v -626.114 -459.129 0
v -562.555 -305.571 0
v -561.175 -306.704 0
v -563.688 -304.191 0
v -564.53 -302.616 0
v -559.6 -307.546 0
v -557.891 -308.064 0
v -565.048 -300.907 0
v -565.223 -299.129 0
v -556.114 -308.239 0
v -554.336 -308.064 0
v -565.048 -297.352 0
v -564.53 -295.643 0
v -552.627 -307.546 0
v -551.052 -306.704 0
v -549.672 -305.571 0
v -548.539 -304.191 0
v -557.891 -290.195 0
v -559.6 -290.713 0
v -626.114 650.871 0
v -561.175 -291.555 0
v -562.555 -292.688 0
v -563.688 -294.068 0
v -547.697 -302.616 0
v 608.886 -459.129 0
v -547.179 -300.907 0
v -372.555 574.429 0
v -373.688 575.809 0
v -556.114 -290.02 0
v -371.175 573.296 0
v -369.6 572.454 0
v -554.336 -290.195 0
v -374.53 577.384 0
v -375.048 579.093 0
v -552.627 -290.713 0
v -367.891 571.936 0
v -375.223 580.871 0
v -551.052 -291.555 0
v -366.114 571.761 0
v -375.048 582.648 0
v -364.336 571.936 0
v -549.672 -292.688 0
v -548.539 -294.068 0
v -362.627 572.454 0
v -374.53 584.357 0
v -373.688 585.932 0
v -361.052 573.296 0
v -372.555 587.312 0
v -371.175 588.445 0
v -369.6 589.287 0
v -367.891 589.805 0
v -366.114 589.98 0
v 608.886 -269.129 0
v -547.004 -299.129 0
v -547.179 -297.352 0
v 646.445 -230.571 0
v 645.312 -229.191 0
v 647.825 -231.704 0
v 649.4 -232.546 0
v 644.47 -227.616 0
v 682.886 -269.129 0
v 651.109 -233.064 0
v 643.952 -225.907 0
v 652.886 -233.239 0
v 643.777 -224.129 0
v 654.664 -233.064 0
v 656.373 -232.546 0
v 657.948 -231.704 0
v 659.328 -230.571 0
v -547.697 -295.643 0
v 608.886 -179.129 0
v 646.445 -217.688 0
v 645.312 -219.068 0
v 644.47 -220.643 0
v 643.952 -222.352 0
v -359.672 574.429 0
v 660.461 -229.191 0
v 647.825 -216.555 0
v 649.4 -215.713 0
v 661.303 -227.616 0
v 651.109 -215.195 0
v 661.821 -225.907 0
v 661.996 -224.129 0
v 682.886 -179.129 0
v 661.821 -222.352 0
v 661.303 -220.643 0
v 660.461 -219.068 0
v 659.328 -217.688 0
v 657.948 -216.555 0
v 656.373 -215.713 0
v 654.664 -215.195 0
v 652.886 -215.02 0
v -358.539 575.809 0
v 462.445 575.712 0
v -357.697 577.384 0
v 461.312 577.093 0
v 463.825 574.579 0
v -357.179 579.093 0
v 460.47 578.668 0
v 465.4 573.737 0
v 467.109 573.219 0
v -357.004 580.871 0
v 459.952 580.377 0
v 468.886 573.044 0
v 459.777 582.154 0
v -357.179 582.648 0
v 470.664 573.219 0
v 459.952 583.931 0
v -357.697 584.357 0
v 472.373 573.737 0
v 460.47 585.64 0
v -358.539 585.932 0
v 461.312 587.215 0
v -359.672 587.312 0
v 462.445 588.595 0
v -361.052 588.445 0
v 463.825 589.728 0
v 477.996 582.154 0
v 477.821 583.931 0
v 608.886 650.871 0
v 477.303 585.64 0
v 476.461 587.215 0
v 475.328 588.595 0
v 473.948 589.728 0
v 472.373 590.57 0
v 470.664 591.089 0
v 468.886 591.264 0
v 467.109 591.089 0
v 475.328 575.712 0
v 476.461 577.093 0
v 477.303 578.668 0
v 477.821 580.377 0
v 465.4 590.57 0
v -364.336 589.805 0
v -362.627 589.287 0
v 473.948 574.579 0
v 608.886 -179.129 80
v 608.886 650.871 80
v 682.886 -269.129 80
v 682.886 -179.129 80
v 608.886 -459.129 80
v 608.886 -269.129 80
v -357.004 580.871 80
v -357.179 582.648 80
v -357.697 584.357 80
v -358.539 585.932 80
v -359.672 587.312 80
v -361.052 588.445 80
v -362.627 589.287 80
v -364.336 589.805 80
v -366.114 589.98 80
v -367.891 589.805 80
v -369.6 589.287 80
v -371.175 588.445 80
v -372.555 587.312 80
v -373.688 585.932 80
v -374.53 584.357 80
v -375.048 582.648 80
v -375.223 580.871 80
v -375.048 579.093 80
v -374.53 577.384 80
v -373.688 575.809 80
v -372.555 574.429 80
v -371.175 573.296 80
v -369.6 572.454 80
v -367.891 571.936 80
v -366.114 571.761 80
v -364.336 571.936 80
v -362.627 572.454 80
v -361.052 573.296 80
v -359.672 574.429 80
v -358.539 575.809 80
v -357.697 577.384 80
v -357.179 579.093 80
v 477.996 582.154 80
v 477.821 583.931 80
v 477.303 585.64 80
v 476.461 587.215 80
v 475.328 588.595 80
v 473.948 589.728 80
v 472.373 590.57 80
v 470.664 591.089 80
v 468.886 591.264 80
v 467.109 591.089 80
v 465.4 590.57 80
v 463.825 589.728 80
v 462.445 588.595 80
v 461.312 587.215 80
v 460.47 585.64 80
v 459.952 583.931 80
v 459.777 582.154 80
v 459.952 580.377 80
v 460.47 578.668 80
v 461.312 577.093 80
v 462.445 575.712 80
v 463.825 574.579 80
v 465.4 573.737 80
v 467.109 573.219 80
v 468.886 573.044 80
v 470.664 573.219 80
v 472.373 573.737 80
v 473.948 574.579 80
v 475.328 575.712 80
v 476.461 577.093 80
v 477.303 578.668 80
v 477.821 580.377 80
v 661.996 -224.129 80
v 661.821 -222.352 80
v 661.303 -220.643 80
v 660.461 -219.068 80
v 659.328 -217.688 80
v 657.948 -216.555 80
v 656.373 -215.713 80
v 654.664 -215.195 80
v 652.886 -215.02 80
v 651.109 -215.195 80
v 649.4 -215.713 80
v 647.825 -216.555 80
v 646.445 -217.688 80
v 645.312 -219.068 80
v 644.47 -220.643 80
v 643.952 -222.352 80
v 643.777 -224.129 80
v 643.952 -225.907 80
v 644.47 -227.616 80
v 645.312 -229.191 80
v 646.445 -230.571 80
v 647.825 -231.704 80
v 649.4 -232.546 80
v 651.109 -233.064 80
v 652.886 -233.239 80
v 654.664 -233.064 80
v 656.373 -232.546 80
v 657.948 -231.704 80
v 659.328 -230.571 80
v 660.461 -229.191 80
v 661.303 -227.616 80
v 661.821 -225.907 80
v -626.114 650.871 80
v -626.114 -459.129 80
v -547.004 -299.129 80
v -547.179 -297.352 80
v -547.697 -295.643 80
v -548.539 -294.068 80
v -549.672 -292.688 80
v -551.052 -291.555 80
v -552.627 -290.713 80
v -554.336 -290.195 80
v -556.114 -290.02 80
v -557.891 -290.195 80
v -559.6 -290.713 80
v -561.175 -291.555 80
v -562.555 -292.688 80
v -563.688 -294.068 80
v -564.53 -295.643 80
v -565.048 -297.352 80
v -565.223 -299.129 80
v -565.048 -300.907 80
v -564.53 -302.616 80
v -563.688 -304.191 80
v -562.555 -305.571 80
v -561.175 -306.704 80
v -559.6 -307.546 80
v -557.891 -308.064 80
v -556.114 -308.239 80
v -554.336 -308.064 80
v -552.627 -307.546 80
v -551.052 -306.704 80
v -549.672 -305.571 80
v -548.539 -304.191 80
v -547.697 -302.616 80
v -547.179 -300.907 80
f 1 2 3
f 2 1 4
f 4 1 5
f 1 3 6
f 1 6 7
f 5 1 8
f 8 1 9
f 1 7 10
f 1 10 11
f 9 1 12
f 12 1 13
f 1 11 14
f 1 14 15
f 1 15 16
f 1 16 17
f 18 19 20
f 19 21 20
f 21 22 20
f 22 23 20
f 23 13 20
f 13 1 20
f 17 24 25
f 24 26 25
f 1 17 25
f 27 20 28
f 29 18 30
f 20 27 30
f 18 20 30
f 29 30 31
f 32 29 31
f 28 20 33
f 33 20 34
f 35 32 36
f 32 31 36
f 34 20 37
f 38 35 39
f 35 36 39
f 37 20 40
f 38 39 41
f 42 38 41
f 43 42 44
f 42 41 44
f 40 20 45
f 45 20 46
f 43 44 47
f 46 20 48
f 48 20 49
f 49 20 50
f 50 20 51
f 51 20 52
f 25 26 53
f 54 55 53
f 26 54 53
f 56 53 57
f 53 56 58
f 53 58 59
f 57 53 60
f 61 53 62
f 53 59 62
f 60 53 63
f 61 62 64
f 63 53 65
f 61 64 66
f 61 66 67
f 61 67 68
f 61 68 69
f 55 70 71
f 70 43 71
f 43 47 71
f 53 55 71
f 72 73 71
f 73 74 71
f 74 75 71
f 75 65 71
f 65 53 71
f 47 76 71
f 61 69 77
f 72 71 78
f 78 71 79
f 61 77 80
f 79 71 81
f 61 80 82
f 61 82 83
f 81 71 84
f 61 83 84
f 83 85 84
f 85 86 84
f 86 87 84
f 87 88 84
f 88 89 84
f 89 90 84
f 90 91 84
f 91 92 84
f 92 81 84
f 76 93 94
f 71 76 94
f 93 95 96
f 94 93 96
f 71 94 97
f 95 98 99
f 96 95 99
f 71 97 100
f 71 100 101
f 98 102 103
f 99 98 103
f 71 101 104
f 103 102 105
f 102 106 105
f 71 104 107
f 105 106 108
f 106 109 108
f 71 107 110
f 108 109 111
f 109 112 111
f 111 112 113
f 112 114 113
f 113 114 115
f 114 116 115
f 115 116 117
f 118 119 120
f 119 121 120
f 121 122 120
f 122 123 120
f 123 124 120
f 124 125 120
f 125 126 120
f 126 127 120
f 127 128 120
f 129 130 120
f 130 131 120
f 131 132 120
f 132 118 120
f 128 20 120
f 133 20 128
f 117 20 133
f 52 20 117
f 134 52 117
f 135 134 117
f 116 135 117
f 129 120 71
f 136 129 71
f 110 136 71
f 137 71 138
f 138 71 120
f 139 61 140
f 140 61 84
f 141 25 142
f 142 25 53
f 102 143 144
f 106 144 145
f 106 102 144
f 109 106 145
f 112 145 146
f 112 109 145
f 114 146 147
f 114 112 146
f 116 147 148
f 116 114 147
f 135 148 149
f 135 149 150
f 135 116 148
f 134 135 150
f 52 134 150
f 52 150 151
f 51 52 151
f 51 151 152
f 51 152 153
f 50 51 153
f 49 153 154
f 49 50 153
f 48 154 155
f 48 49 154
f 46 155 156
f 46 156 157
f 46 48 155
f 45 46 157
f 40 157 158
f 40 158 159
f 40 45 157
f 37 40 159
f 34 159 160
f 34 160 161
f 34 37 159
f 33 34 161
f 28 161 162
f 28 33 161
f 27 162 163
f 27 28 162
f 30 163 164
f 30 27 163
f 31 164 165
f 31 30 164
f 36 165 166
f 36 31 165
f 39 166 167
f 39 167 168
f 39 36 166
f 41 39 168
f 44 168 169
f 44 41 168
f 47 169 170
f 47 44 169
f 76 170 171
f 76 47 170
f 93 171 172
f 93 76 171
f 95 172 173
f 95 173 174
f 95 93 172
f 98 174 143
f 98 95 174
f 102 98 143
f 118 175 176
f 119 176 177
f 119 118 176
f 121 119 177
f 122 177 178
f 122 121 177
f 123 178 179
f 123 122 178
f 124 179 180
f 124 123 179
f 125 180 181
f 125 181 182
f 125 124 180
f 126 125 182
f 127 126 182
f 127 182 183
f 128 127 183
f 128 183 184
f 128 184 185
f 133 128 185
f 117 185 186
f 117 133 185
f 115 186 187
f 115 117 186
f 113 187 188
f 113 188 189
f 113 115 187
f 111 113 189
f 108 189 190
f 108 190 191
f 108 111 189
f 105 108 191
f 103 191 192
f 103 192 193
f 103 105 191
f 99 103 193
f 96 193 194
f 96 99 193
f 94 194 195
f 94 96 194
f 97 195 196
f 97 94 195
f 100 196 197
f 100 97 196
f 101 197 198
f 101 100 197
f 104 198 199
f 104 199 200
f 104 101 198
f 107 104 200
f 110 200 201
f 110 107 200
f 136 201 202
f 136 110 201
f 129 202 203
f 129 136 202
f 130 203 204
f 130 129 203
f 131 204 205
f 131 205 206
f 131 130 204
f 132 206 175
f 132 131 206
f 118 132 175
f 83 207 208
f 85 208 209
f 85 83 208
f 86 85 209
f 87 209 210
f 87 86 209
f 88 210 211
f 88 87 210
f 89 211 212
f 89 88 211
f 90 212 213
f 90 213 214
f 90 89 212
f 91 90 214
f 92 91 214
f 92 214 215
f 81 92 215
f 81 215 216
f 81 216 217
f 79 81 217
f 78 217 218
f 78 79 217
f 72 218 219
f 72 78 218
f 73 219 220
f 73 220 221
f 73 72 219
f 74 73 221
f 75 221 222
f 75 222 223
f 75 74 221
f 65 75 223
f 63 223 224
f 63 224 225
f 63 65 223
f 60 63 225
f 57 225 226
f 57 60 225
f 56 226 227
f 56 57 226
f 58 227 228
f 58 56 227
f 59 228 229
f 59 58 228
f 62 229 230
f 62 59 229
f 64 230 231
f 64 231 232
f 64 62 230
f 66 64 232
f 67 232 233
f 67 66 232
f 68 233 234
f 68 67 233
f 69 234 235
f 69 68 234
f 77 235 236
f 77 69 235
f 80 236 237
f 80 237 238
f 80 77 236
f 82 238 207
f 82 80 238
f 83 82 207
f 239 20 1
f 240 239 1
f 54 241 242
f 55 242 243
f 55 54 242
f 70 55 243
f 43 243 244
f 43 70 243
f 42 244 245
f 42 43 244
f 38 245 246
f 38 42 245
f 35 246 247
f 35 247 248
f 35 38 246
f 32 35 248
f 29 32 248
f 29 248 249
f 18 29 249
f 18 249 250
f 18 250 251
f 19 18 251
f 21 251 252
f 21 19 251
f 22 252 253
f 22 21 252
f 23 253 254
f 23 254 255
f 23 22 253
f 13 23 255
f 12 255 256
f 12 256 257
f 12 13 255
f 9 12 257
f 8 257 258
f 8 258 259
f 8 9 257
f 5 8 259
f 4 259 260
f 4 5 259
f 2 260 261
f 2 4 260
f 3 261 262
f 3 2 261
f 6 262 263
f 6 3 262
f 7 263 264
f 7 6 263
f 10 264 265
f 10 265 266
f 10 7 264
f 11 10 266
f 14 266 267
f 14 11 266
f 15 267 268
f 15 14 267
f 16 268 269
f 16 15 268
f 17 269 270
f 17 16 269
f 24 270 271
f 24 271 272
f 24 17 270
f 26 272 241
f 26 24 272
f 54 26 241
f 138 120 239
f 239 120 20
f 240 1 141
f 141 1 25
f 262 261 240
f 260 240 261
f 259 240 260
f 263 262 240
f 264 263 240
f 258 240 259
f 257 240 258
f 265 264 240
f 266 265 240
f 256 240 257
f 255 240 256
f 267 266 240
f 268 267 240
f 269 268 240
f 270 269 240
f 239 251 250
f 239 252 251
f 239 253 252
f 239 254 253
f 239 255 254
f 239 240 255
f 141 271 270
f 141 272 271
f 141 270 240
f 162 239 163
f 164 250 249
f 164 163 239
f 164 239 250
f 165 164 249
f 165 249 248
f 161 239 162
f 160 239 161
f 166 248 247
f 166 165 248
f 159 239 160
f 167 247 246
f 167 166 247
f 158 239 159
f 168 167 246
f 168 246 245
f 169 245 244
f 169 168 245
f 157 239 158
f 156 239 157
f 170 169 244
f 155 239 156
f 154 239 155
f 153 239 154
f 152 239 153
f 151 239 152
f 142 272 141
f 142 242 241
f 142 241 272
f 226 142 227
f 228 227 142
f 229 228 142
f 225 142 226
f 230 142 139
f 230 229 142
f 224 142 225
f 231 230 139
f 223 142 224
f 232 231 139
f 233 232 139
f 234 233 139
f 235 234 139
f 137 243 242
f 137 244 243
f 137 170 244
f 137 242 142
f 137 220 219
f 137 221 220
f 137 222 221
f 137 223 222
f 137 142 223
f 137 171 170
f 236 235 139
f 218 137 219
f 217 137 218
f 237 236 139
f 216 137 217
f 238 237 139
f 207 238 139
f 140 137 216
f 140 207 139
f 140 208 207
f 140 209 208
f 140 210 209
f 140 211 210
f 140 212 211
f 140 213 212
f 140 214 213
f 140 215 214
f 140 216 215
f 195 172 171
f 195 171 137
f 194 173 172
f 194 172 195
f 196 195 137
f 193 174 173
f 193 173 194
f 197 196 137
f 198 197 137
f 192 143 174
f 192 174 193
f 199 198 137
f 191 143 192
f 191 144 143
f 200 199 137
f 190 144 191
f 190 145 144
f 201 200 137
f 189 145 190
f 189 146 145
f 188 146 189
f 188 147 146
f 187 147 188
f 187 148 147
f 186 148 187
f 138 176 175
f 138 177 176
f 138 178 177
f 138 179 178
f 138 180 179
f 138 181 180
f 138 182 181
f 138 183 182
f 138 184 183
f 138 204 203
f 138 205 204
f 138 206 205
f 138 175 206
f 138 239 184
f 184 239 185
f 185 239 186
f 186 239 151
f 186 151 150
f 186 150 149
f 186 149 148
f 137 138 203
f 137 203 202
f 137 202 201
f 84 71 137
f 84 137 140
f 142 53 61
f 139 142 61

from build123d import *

# Parameters (mm, degrees)
F0_R     = 9.109782
F0_W     = 74
F0_H     = 90
F1_DEPTH = 80


with BuildPart() as f1:
    # F0 (on Top) → F1 (new body)
    with BuildSketch(Plane.XY):
        Polygon((608.88648, 650.870509), (-626.11352, 650.870509), (-626.11352, -459.129491), (608.88648, -459.129491), (608.88648, -269.129491), (608.88648, -179.129491), align=None)
        with Locations((-556.11352, -299.129491)):
            Circle(F0_R, mode=Mode.SUBTRACT)
        with Locations((-366.11352, 580.870509)):
            Circle(F0_R, mode=Mode.SUBTRACT)
        with Locations((468.88648, 582.153797)):
            Circle(F0_R, mode=Mode.SUBTRACT)
        with Locations((645.88648, -224.129491)):
            Rectangle(F0_W, F0_H)
        with Locations((652.88648, -224.129491)):
            Circle(F0_R, mode=Mode.SUBTRACT)
    extrude(amount=F1_DEPTH)


solid = f1.part
